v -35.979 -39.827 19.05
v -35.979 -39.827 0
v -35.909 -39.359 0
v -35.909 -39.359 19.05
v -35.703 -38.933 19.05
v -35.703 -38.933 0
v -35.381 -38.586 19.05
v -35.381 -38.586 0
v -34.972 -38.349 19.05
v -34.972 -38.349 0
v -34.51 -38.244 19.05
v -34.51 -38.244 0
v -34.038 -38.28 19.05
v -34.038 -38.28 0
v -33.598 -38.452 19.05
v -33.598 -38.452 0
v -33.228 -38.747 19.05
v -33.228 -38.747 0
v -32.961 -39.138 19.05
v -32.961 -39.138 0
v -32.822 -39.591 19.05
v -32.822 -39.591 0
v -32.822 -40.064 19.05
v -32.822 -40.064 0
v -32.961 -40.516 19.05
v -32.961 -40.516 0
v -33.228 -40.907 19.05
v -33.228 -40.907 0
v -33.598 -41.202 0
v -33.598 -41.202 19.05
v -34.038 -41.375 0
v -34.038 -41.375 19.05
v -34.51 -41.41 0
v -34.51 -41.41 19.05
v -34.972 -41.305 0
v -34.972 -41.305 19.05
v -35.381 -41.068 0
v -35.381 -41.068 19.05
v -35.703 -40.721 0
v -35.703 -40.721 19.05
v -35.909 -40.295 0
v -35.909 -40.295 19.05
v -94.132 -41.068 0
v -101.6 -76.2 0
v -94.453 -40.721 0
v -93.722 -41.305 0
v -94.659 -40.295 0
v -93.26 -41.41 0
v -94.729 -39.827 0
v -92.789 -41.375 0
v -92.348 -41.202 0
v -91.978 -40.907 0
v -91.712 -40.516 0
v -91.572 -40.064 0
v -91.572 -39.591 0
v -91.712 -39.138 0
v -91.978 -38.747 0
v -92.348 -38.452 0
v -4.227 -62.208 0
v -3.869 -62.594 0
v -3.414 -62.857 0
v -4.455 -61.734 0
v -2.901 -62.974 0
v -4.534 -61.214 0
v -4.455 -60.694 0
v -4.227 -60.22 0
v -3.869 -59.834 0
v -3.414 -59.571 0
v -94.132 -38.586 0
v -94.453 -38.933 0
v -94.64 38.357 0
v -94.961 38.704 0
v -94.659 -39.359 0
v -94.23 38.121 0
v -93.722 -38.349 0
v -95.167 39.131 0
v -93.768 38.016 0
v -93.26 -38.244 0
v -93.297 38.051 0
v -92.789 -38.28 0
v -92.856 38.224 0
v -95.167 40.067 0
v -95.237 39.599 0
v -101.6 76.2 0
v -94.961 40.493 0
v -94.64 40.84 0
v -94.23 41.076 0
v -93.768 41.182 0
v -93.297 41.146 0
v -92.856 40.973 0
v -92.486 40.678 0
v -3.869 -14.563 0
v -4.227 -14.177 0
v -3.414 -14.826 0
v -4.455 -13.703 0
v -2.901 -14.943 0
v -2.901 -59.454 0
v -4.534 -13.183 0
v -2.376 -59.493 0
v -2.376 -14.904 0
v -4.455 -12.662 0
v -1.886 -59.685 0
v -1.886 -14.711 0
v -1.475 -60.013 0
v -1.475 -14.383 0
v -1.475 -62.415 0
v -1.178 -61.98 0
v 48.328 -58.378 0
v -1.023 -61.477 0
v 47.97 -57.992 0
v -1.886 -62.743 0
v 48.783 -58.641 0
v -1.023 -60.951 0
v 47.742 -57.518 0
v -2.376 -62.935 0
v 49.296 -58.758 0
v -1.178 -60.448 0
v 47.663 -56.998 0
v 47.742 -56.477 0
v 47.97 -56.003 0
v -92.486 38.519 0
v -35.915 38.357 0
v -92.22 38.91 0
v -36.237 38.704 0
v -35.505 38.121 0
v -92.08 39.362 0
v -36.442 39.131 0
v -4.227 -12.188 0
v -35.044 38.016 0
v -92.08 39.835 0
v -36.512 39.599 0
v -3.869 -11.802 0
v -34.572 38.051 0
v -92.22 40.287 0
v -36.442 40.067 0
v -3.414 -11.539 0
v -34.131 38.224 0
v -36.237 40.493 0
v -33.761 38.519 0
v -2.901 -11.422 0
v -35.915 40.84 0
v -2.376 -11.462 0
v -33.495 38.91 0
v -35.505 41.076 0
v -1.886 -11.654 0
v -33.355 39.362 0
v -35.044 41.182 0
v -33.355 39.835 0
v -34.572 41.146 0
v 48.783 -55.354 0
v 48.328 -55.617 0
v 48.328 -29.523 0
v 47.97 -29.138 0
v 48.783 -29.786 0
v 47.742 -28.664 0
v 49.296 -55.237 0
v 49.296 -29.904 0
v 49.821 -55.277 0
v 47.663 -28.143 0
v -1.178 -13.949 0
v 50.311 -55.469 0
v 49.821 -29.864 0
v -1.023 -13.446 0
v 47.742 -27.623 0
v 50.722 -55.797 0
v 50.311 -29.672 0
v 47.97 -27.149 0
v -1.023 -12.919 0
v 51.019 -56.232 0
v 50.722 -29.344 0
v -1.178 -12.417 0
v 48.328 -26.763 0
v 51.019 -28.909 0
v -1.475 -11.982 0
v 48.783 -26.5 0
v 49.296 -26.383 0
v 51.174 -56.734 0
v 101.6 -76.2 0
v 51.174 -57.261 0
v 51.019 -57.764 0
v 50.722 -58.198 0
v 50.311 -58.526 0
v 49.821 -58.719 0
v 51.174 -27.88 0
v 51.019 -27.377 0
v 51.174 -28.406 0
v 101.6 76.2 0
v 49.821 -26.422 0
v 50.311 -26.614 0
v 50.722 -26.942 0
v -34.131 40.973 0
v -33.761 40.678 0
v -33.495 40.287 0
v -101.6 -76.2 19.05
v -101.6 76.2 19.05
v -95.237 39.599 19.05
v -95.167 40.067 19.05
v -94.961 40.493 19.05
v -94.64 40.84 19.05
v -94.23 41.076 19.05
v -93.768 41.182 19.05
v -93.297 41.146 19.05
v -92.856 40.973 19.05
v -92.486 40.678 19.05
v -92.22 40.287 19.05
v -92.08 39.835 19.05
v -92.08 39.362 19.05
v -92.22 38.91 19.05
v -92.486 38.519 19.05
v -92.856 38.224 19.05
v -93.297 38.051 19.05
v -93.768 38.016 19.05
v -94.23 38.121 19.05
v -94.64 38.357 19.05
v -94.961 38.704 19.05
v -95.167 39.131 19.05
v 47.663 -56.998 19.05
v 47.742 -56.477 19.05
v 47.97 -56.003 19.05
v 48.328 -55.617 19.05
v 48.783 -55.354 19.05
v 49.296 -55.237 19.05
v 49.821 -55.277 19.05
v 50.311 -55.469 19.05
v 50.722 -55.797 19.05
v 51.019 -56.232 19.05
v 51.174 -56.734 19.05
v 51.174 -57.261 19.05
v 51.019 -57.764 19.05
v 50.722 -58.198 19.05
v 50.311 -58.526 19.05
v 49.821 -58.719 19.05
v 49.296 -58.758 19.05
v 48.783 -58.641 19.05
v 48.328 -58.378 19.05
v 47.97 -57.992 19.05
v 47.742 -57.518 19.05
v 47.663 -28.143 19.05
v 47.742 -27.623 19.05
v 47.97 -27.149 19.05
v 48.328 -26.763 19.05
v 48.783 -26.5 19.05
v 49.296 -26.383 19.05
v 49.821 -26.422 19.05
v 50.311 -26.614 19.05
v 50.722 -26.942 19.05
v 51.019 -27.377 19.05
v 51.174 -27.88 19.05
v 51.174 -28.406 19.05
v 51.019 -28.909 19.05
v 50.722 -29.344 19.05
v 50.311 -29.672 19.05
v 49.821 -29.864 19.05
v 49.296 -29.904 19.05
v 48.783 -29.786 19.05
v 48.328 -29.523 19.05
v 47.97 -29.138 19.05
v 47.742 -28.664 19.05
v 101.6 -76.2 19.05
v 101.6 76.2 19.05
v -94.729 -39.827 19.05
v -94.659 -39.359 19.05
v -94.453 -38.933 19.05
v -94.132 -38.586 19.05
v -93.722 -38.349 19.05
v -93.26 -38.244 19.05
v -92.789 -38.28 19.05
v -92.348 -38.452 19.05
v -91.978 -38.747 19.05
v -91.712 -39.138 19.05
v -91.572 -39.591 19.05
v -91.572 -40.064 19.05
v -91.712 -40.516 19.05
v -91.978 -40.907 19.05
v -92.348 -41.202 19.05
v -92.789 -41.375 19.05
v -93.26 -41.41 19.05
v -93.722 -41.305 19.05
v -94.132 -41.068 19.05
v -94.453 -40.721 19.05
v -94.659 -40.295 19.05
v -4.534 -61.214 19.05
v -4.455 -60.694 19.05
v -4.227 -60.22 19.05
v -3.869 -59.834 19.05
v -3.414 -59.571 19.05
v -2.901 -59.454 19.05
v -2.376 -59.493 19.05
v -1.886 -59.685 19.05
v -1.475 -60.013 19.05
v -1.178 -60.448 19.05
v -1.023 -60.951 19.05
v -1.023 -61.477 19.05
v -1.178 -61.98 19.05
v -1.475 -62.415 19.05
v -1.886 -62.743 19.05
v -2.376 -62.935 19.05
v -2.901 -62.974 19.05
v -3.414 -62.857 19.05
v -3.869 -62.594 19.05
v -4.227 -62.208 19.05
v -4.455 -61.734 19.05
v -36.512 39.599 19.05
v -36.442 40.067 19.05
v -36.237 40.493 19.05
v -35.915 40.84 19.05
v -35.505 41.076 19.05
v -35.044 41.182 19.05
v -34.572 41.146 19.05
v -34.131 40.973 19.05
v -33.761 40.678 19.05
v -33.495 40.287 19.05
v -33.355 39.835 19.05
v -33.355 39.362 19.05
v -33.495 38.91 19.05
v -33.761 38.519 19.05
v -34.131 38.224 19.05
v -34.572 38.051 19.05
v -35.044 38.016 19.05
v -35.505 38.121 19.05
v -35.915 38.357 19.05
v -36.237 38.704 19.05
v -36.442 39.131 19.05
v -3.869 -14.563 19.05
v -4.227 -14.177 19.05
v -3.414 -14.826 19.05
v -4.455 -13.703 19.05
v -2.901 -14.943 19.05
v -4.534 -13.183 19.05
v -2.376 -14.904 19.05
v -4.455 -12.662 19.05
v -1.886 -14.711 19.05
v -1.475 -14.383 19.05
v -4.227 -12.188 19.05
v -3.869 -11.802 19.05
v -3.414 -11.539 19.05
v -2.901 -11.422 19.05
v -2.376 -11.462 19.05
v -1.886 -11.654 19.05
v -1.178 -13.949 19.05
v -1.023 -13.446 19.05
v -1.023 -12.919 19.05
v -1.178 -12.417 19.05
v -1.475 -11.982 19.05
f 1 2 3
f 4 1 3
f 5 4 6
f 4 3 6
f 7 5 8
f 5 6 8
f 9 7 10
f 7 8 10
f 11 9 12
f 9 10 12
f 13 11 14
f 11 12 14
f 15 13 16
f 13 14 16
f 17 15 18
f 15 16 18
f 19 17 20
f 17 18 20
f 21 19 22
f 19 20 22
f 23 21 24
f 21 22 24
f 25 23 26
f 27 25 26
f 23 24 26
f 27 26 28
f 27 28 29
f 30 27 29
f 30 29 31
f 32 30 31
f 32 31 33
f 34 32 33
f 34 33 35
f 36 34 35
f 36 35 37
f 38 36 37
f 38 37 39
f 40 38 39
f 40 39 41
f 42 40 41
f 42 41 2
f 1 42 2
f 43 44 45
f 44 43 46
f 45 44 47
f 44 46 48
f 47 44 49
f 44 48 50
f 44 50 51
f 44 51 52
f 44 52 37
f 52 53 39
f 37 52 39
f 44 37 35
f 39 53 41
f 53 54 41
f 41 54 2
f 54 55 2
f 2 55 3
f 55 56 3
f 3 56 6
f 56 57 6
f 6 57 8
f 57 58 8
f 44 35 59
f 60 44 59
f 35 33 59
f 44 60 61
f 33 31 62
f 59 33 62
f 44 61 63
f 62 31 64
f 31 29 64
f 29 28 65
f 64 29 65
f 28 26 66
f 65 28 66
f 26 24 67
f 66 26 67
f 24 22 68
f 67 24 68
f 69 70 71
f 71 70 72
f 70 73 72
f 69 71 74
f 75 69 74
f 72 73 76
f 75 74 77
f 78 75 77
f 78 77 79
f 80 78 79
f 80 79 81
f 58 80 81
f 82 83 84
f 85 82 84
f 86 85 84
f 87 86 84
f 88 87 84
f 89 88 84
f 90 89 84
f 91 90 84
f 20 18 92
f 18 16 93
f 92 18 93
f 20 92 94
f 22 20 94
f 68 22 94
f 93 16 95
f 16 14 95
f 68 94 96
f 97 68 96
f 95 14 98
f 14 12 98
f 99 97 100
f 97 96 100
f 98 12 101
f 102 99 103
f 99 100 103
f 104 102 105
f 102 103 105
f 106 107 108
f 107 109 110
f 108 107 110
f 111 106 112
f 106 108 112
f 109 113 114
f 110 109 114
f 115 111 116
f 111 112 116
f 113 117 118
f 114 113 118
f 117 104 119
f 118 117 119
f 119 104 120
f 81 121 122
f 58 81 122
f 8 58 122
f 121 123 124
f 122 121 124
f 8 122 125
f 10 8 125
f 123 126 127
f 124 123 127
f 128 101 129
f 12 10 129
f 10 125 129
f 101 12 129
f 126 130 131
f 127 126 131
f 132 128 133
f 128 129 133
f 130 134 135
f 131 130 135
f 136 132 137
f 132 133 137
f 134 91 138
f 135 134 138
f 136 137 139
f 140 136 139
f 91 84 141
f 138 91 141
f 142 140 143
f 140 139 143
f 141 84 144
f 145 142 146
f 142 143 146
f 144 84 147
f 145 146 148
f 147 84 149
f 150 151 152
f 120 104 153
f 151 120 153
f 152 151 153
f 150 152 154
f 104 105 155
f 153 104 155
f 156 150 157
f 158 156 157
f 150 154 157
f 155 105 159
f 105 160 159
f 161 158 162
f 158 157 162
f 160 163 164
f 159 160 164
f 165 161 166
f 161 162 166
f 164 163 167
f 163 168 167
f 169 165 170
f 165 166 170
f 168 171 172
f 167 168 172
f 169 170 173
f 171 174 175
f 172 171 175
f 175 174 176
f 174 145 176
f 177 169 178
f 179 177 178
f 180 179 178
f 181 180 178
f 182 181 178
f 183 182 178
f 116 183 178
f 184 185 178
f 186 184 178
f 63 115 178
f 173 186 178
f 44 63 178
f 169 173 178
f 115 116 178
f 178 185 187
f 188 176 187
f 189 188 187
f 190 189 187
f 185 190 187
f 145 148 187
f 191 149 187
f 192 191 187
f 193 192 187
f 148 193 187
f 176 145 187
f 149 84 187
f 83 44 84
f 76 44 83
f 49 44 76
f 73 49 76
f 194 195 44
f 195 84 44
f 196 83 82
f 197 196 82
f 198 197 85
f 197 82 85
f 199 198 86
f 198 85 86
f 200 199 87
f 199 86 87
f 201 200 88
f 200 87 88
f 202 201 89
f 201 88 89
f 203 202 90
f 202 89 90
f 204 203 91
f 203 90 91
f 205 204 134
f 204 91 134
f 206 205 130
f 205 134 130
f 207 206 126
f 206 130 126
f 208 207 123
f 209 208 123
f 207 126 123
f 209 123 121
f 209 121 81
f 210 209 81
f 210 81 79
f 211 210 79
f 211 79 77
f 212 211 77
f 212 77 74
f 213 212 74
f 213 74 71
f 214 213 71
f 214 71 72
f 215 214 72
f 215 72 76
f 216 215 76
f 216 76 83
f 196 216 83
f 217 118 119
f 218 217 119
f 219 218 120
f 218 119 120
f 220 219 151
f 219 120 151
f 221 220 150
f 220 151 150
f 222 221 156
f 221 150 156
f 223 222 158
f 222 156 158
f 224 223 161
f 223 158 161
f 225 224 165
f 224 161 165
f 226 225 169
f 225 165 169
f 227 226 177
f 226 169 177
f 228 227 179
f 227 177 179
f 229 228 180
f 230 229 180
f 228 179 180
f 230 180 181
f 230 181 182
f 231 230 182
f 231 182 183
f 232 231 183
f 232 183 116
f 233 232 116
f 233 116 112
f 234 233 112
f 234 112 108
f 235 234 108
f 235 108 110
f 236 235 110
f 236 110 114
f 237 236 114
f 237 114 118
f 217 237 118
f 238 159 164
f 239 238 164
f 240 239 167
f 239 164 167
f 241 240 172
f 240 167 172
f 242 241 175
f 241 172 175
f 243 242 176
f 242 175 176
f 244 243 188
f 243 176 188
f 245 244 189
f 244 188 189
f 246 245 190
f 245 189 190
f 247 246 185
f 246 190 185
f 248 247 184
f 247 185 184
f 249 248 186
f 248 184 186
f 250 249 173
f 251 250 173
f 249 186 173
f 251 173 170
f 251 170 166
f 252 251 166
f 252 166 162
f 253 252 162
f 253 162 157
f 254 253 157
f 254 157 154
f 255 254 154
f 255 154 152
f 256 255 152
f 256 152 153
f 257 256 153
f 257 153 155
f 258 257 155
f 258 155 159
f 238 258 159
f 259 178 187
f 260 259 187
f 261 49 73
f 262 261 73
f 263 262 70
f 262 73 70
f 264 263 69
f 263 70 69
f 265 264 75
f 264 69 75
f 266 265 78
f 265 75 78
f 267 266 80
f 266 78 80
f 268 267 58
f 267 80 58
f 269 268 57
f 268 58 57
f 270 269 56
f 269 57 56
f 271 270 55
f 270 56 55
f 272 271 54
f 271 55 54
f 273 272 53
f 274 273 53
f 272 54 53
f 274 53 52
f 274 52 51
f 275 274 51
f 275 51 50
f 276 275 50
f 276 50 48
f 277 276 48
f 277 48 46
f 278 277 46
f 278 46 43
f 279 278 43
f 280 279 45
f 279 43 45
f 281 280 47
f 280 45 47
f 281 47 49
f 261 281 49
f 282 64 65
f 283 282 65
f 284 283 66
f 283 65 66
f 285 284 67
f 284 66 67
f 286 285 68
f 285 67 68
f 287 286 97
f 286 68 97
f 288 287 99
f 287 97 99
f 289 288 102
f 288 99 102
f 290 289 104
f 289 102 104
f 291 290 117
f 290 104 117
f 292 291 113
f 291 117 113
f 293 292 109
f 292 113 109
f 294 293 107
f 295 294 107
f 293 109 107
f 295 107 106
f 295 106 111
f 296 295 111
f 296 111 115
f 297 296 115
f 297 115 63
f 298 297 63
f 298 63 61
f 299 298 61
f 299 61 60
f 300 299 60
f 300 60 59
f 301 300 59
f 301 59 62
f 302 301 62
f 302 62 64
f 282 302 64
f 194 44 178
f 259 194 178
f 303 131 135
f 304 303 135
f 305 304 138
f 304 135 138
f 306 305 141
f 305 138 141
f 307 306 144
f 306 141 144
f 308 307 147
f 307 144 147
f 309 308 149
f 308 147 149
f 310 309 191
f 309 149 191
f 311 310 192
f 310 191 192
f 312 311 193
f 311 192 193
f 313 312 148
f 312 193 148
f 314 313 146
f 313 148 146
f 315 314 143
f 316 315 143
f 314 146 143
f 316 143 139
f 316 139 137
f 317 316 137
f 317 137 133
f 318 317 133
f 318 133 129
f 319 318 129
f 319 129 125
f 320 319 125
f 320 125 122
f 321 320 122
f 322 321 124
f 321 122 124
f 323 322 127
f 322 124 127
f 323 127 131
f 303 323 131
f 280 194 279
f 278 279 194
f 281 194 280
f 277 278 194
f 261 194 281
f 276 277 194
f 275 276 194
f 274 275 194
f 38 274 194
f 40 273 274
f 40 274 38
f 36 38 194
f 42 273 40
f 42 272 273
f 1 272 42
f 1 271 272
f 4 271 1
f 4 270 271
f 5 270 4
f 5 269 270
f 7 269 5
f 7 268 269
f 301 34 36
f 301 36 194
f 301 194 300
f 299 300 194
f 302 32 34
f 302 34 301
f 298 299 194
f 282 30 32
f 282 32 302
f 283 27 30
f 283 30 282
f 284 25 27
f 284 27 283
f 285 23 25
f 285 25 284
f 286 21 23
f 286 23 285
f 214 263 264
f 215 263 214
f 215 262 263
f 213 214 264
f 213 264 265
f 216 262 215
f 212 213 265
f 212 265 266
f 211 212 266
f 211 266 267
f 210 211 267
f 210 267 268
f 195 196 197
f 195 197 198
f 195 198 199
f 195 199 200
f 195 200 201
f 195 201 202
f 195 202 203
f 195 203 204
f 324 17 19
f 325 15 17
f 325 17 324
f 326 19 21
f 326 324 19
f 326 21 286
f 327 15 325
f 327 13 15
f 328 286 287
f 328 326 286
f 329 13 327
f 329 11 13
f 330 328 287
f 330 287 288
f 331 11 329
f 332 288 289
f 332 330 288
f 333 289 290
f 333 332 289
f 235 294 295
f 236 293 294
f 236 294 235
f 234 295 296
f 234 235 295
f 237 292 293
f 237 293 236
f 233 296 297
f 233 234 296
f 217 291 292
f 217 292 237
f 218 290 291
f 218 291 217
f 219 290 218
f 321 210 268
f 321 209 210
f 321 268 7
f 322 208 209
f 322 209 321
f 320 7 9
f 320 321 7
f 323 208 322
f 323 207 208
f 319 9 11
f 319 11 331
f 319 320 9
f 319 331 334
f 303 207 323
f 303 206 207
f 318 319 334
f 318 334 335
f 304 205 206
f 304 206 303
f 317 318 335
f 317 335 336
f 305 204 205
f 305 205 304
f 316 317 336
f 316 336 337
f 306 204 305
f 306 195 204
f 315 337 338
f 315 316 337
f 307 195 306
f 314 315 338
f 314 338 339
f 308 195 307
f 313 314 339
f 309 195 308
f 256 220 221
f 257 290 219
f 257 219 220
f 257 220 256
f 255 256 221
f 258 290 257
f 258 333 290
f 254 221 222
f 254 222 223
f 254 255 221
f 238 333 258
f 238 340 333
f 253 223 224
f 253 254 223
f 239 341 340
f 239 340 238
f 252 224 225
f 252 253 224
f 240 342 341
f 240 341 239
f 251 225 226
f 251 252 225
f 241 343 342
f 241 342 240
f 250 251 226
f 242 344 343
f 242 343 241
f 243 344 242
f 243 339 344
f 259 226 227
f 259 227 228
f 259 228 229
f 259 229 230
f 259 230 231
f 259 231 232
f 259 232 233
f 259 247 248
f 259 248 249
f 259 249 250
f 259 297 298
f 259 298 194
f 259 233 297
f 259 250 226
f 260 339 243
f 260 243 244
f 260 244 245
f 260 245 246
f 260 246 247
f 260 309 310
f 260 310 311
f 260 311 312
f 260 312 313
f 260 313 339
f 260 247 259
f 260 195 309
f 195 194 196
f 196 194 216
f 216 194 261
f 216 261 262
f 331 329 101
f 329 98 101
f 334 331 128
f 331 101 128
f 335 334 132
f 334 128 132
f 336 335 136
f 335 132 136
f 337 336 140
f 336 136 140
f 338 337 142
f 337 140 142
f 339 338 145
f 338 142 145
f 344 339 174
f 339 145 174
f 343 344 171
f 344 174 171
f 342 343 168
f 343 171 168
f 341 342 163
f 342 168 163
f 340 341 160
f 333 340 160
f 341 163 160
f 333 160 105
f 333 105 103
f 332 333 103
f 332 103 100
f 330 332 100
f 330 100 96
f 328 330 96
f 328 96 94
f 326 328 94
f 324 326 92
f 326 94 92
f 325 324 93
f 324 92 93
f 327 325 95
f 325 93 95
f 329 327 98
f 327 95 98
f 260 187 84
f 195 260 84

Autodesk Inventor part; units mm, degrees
ref_plane "YZ Plane" through (0, 0, 0) normal (1, 0, 0) x (0, 1, 0)
ref_plane "XZ Plane" through (0, 0, 0) normal (0, 1, 0) x (-1, 0, 0)
ref_plane "XY Plane" through (0, 0, 0) normal (0, 0, 1) x (1, 0, 0)
sketch "Sketch1" plane through (0, 0, 0) normal (0, 0, 1) x (1, 0, 0)
  line L0 (-142.24, 0) -> (142.24, 0) projected
  line L1 (0, -106.68) -> (0, 106.68) projected
  line L2 (-101.6, -76.2) -> (101.6, -76.2)
  line L3 (101.6, -76.2) -> (101.6, 76.2)
  line L4 (101.6, 76.2) -> (-101.6, 76.2)
  line L5 (-101.6, 76.2) -> (-101.6, -76.2)
  point P0 (0, 0)
  dimension "d0" = 203.2
  dimension "d1" = 152.4
extrude "Extrusion1" add sketch "Sketch1" along normal blind 19.05
sketch "Sketch14" plane through (0, 0, 0) normal (0, 0, -1) x (-1, 0, 0)
  circle A0 centre (-49.4284, -56.9976) radius 1.7653
  line L0 (-101.6, -76.2) -> (-101.6, 76.2) projected
  circle A1 centre (-49.4284, -28.1432) radius 1.7653
  circle A2 centre (2.7686, -61.214) radius 1.7653
  line L1 (101.6, -76.2) -> (-101.6, -76.2) projected
  circle A3 centre (2.7686, -13.1826) radius 1.7653
  line L2 (101.6, 76.2) -> (101.6, -76.2) projected
  point P0 (0, 0)
  dimension "d20" = 3.5306
  dimension "d21" = 28.8544
  dimension "d22" = 3.5306
  dimension "d23" = 14.986
  dimension "d24" = 3.5306
  dimension "d26" = 63.0174
  dimension "d27" = 19.2024
  dimension "d28" = 3.5306
  dimension "d36" = 52.1716
  dimension "d37" = 52.1716
  dimension "d38" = 104.3686
  dimension "d39" = 104.3686
extrude "Extrusion7" cut sketch "Sketch14" against normal blind 25.4
sketch "Sketch17" plane through (0, 0, 0) normal (0, 0, -1) x (-1, 0, 0)
  circle A0 centre (34.3916, -39.8272) radius 1.5875
  line L0 (101.6, -76.2) -> (-101.6, -76.2) projected
  line L1 (101.6, 76.2) -> (101.6, -76.2) projected
  circle A1 centre (93.1418, -39.8272) radius 1.5875
  circle A2 centre (34.925, 39.5986) radius 1.5875
  circle A3 centre (93.6498, 39.5986) radius 1.5875
  line L2 (-101.6, 76.2) -> (101.6, 76.2) projected
  point P0 (0, 0)
  dimension "d48" = 36.3728
  dimension "d49" = 3.175
  dimension "d50" = 67.2084
  dimension "d51" = 8.4582
  dimension "d52" = 3.175
  dimension "d53" = 36.3728
  dimension "d54" = 66.675
  dimension "d55" = 3.175
  dimension "d56" = 7.9502
  dimension "d59" = 36.6014
  dimension "d60" = 36.6014
extrude "Extrusion9" cut sketch "Sketch17" against normal blind 19.05
properties part number "base of car"
